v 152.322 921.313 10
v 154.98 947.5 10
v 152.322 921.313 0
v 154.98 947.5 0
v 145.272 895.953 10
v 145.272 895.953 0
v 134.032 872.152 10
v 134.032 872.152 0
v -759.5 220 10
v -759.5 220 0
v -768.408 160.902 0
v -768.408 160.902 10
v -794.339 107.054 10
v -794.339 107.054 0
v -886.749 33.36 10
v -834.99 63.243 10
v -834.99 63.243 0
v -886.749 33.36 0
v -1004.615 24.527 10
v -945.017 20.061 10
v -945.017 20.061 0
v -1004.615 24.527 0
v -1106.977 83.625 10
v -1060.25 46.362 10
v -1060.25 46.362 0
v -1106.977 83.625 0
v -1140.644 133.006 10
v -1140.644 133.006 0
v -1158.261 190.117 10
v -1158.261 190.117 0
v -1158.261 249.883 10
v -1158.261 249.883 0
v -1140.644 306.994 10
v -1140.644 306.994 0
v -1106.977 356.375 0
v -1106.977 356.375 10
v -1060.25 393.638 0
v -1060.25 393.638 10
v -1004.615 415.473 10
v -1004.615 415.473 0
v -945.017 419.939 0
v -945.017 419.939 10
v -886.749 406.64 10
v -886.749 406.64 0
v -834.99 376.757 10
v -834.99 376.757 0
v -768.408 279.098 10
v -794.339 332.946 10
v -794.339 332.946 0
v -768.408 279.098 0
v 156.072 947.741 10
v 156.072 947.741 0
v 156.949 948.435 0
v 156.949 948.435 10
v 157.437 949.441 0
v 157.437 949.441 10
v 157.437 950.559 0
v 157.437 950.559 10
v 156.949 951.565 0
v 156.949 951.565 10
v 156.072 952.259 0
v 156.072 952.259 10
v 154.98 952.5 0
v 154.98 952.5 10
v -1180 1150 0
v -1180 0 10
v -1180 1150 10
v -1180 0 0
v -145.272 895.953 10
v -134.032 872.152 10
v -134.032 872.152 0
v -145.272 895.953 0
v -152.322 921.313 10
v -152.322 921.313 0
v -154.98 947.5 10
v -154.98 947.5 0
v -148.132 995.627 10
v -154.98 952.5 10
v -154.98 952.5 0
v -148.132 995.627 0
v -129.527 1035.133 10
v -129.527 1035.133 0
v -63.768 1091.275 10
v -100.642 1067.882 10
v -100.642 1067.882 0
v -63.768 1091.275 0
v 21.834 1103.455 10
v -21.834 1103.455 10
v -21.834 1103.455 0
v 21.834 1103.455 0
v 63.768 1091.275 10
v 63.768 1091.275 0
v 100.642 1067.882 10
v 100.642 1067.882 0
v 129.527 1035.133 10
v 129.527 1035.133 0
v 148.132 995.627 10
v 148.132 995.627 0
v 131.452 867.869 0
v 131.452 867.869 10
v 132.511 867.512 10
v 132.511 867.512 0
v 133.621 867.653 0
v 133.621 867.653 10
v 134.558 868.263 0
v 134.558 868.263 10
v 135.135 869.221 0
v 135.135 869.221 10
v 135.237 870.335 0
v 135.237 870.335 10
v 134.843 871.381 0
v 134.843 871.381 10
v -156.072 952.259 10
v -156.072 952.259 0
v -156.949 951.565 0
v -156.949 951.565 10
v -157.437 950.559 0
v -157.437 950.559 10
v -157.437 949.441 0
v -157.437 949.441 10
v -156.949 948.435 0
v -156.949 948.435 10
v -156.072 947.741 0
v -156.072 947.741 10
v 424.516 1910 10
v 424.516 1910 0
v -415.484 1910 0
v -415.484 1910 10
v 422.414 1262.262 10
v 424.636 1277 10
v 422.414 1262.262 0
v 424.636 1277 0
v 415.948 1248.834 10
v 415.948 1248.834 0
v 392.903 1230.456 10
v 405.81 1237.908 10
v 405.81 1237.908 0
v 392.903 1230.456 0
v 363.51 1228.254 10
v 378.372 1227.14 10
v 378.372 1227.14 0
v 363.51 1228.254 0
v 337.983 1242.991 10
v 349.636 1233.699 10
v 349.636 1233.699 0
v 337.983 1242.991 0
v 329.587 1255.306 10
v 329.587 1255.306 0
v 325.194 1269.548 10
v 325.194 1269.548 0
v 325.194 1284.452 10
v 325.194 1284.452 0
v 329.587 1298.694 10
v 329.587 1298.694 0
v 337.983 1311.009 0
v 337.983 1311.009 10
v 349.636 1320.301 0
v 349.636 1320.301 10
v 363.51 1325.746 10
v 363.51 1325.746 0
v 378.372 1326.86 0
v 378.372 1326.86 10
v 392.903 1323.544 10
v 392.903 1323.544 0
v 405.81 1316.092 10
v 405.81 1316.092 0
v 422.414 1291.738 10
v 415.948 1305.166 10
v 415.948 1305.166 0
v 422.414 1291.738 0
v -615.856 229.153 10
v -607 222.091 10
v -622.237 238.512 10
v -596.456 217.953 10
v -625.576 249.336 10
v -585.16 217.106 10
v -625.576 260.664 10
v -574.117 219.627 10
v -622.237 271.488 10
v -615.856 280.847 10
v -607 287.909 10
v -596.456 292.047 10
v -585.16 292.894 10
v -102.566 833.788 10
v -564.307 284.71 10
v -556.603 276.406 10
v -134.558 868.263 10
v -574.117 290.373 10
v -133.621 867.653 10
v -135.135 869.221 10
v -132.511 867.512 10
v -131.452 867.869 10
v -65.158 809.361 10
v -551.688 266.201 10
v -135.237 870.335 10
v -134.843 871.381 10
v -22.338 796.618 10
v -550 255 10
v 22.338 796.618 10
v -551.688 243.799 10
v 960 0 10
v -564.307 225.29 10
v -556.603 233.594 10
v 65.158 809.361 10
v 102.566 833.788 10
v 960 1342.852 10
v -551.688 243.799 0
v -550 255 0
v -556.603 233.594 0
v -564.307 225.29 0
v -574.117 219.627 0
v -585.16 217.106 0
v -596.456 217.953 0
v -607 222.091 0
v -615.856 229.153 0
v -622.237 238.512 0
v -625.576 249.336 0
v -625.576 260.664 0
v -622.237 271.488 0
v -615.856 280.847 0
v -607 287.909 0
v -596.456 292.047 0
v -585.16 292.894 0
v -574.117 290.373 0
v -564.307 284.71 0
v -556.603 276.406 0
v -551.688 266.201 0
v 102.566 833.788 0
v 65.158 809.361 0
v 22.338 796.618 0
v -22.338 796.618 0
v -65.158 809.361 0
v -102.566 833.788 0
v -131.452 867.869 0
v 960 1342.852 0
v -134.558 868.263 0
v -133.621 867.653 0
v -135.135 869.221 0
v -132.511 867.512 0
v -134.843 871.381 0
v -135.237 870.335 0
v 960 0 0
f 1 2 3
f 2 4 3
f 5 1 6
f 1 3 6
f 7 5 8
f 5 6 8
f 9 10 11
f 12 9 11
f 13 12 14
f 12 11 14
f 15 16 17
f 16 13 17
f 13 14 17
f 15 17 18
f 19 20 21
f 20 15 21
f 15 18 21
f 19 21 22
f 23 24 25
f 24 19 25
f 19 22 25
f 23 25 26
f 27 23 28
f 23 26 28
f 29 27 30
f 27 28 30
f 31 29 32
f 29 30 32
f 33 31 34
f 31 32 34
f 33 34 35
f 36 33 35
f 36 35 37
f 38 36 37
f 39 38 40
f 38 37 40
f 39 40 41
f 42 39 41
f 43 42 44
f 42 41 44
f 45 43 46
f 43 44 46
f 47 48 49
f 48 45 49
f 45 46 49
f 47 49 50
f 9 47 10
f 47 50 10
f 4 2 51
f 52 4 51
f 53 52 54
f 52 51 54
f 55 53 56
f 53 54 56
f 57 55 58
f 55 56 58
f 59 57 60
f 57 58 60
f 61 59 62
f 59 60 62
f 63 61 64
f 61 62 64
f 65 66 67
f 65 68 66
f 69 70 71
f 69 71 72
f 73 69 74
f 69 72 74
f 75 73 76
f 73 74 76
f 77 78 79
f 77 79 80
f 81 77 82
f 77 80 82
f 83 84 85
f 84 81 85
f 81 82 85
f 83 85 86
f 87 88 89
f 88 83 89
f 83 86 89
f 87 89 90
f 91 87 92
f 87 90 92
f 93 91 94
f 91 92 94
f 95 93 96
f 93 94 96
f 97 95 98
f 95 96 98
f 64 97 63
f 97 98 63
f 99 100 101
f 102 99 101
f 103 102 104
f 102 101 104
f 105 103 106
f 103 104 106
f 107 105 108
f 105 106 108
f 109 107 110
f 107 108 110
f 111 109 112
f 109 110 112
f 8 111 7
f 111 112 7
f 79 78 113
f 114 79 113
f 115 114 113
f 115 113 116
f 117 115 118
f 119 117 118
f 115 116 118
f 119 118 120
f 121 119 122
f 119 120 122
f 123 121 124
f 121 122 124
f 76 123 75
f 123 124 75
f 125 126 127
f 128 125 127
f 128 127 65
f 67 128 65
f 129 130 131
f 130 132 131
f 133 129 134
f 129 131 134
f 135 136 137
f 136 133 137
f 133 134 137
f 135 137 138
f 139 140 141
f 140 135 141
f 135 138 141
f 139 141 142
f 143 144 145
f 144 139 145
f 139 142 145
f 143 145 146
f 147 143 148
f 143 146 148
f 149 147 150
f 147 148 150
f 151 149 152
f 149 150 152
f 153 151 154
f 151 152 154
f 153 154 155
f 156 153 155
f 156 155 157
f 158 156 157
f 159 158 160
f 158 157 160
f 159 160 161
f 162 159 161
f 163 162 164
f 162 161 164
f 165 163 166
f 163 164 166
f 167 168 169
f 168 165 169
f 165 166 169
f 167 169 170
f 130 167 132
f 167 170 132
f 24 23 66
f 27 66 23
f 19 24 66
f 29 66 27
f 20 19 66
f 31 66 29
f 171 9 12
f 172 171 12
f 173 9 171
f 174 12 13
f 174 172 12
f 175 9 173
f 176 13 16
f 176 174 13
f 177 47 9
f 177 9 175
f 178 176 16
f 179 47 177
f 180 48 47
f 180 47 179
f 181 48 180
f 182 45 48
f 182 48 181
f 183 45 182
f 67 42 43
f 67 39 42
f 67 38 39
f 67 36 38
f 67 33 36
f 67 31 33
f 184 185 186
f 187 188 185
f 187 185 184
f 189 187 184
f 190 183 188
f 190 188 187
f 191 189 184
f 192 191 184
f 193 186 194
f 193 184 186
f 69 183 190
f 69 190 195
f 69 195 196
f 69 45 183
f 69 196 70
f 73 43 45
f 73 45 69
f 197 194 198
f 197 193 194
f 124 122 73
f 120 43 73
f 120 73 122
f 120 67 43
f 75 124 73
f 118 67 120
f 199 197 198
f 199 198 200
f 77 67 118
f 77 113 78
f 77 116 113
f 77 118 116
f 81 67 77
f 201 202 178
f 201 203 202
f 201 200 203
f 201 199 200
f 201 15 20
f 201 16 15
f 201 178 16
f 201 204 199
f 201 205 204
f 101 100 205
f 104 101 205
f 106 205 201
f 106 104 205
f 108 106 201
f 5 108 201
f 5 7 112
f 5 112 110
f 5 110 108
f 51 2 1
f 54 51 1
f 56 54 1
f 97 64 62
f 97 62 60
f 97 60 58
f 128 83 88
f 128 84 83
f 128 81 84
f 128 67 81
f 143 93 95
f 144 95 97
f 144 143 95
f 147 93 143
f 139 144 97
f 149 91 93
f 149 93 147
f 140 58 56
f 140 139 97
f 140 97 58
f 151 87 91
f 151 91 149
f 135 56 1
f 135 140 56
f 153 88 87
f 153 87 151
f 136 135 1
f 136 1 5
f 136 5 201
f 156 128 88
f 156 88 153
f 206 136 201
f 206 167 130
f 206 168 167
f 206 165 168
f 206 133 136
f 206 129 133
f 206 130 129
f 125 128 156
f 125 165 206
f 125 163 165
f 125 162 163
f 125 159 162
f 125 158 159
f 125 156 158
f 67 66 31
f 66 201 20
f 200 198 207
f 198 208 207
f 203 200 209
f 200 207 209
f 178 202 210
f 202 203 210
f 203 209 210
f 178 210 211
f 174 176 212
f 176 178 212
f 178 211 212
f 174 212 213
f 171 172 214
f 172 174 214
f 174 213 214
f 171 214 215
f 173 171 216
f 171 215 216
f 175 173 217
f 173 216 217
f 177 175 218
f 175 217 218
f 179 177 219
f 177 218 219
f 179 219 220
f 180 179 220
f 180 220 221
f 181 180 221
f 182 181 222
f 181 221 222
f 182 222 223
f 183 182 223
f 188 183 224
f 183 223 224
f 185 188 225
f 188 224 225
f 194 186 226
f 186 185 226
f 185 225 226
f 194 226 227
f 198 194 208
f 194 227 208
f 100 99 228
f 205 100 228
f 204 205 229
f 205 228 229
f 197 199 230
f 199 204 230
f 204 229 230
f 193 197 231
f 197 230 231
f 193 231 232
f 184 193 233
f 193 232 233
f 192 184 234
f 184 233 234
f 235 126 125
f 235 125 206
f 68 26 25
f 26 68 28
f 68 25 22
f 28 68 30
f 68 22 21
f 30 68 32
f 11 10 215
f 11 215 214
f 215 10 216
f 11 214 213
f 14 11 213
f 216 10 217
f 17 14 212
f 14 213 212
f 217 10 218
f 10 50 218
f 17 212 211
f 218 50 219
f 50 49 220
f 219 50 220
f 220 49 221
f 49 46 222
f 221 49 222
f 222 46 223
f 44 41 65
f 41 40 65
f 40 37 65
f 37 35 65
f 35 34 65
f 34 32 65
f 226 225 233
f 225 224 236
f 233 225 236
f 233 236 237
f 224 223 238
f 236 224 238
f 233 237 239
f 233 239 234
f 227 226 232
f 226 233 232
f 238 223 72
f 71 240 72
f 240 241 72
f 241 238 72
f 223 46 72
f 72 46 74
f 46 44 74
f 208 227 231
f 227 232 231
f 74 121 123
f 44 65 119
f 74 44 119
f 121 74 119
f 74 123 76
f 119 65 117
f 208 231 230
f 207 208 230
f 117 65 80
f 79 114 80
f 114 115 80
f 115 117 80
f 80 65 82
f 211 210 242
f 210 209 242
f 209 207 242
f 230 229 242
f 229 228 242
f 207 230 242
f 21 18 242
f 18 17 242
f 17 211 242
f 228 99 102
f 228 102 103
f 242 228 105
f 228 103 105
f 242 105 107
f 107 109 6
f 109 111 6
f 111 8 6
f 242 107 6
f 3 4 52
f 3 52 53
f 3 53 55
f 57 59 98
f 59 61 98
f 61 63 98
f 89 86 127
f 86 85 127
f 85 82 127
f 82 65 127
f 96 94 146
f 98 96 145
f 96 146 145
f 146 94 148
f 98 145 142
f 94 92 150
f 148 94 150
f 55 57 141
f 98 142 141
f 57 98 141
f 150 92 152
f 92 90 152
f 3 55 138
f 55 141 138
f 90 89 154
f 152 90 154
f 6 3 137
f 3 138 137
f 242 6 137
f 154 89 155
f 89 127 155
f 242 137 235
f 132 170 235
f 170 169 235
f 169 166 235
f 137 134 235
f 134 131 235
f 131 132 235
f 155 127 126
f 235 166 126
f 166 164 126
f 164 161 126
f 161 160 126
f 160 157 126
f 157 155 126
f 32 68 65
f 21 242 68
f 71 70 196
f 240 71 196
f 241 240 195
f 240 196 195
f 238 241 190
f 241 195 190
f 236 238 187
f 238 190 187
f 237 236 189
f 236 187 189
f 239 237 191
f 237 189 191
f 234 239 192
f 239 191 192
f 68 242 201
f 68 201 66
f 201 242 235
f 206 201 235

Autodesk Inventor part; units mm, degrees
ref_plane "YZ Plane" through (0, 0, 0) normal (1, 0, 0) x (0, 1, 0)
ref_plane "XZ Plane" through (0, 0, 0) normal (0, 1, 0) x (-1, 0, 0)
ref_plane "XY Plane" through (0, 0, 0) normal (0, 0, 1) x (1, 0, 0)
sketch "Sketch1" plane through (0, 0, 0) normal (0, 0, 1) x (1, 0, 0)
  line L0 (0, 0) -> (0, 1910) construction
  line L1 (424.5155, 1910) -> (-415.4845, 1910)
  line L2 (-415.4845, 1910) -> (-1180, 1150)
  line L3 (-1180, 0) -> (-1180, 1150)
  line L4 (960, 0) -> (960, 1342.8524)
  line L5 (424.5155, 1910) -> (960, 1342.8524)
  circle A0 centre (0, 950) radius 195 construction
  line L6 (960, 0) -> (-1180, 0)
  circle A1 centre (-960, 220) radius 200.5
  circle A2 centre (-588, 255) radius 38
  circle A3 centre (374.6358, 1277) radius 50
  circle A4 centre (0, 950) radius 155
  point P0 (0, 955)
  dimension "d1" = 840
  dimension "d3" = 1150
  dimension "d11" = 390
  dimension "d12" = 1180
  dimension "d13" = 950
  dimension "d14" = 76
  dimension "d15" = 1910
  dimension "d16" = 255
  dimension "d17" = 220
  dimension "d18" = 401
  dimension "d19" = 220
  dimension "d21" = 1277
  dimension "d22" = 1554.6358
  dimension "d23" = 100
  dimension "d33" = 2140
  dimension "d34" = 494
  dimension "d45" = 310
  dimension "d49" = 372
  dimension "d51" = 780
  dimension "d52" = 1078
extrude "Extrusion1" add sketch "Sketch1" along normal blind 10
sketch "Sketch3" plane through (0, 0, 10) normal (0, 0, 1) x (1, 0, 0)
  line L0 (-400, 950) -> (400, 950) construction
  circle A0 centre (0, 950) radius 155 projected
  circle A1 centre (155, 950) radius 2.5
  circle A2 centre (-155, 950) radius 2.5
  line L1 (132.7592, 870) -> (-132.7592, 870) construction
  circle A3 centre (132.7592, 870) radius 2.5
  circle A4 centre (-132.7592, 870) radius 2.5
  point P0 (0, 0)
  point P1 (-154.9798, 947.5001)
  point P2 (-154.9798, 952.4999)
  point P3 (154.9798, 947.5001)
  point P4 (154.9798, 952.4999)
  point P5 (134.0322, 872.1516)
  point P6 (131.4516, 867.8692)
  dimension "d47" = 5
  dimension "d48" = 80
extrude "Extrusion3" cut sketch "Sketch3" against normal through all contours A0 A1 | A0 A2 | A3 A0 | A4 A0 | A0 A4 picked at (155.7492, 949.3589) picked at (-155.8257, 950.101) picked at (133.5004, 869.6223)
equation "\"d17\" = d19"
properties part number "ДМФ 012 Стенка Нос"
